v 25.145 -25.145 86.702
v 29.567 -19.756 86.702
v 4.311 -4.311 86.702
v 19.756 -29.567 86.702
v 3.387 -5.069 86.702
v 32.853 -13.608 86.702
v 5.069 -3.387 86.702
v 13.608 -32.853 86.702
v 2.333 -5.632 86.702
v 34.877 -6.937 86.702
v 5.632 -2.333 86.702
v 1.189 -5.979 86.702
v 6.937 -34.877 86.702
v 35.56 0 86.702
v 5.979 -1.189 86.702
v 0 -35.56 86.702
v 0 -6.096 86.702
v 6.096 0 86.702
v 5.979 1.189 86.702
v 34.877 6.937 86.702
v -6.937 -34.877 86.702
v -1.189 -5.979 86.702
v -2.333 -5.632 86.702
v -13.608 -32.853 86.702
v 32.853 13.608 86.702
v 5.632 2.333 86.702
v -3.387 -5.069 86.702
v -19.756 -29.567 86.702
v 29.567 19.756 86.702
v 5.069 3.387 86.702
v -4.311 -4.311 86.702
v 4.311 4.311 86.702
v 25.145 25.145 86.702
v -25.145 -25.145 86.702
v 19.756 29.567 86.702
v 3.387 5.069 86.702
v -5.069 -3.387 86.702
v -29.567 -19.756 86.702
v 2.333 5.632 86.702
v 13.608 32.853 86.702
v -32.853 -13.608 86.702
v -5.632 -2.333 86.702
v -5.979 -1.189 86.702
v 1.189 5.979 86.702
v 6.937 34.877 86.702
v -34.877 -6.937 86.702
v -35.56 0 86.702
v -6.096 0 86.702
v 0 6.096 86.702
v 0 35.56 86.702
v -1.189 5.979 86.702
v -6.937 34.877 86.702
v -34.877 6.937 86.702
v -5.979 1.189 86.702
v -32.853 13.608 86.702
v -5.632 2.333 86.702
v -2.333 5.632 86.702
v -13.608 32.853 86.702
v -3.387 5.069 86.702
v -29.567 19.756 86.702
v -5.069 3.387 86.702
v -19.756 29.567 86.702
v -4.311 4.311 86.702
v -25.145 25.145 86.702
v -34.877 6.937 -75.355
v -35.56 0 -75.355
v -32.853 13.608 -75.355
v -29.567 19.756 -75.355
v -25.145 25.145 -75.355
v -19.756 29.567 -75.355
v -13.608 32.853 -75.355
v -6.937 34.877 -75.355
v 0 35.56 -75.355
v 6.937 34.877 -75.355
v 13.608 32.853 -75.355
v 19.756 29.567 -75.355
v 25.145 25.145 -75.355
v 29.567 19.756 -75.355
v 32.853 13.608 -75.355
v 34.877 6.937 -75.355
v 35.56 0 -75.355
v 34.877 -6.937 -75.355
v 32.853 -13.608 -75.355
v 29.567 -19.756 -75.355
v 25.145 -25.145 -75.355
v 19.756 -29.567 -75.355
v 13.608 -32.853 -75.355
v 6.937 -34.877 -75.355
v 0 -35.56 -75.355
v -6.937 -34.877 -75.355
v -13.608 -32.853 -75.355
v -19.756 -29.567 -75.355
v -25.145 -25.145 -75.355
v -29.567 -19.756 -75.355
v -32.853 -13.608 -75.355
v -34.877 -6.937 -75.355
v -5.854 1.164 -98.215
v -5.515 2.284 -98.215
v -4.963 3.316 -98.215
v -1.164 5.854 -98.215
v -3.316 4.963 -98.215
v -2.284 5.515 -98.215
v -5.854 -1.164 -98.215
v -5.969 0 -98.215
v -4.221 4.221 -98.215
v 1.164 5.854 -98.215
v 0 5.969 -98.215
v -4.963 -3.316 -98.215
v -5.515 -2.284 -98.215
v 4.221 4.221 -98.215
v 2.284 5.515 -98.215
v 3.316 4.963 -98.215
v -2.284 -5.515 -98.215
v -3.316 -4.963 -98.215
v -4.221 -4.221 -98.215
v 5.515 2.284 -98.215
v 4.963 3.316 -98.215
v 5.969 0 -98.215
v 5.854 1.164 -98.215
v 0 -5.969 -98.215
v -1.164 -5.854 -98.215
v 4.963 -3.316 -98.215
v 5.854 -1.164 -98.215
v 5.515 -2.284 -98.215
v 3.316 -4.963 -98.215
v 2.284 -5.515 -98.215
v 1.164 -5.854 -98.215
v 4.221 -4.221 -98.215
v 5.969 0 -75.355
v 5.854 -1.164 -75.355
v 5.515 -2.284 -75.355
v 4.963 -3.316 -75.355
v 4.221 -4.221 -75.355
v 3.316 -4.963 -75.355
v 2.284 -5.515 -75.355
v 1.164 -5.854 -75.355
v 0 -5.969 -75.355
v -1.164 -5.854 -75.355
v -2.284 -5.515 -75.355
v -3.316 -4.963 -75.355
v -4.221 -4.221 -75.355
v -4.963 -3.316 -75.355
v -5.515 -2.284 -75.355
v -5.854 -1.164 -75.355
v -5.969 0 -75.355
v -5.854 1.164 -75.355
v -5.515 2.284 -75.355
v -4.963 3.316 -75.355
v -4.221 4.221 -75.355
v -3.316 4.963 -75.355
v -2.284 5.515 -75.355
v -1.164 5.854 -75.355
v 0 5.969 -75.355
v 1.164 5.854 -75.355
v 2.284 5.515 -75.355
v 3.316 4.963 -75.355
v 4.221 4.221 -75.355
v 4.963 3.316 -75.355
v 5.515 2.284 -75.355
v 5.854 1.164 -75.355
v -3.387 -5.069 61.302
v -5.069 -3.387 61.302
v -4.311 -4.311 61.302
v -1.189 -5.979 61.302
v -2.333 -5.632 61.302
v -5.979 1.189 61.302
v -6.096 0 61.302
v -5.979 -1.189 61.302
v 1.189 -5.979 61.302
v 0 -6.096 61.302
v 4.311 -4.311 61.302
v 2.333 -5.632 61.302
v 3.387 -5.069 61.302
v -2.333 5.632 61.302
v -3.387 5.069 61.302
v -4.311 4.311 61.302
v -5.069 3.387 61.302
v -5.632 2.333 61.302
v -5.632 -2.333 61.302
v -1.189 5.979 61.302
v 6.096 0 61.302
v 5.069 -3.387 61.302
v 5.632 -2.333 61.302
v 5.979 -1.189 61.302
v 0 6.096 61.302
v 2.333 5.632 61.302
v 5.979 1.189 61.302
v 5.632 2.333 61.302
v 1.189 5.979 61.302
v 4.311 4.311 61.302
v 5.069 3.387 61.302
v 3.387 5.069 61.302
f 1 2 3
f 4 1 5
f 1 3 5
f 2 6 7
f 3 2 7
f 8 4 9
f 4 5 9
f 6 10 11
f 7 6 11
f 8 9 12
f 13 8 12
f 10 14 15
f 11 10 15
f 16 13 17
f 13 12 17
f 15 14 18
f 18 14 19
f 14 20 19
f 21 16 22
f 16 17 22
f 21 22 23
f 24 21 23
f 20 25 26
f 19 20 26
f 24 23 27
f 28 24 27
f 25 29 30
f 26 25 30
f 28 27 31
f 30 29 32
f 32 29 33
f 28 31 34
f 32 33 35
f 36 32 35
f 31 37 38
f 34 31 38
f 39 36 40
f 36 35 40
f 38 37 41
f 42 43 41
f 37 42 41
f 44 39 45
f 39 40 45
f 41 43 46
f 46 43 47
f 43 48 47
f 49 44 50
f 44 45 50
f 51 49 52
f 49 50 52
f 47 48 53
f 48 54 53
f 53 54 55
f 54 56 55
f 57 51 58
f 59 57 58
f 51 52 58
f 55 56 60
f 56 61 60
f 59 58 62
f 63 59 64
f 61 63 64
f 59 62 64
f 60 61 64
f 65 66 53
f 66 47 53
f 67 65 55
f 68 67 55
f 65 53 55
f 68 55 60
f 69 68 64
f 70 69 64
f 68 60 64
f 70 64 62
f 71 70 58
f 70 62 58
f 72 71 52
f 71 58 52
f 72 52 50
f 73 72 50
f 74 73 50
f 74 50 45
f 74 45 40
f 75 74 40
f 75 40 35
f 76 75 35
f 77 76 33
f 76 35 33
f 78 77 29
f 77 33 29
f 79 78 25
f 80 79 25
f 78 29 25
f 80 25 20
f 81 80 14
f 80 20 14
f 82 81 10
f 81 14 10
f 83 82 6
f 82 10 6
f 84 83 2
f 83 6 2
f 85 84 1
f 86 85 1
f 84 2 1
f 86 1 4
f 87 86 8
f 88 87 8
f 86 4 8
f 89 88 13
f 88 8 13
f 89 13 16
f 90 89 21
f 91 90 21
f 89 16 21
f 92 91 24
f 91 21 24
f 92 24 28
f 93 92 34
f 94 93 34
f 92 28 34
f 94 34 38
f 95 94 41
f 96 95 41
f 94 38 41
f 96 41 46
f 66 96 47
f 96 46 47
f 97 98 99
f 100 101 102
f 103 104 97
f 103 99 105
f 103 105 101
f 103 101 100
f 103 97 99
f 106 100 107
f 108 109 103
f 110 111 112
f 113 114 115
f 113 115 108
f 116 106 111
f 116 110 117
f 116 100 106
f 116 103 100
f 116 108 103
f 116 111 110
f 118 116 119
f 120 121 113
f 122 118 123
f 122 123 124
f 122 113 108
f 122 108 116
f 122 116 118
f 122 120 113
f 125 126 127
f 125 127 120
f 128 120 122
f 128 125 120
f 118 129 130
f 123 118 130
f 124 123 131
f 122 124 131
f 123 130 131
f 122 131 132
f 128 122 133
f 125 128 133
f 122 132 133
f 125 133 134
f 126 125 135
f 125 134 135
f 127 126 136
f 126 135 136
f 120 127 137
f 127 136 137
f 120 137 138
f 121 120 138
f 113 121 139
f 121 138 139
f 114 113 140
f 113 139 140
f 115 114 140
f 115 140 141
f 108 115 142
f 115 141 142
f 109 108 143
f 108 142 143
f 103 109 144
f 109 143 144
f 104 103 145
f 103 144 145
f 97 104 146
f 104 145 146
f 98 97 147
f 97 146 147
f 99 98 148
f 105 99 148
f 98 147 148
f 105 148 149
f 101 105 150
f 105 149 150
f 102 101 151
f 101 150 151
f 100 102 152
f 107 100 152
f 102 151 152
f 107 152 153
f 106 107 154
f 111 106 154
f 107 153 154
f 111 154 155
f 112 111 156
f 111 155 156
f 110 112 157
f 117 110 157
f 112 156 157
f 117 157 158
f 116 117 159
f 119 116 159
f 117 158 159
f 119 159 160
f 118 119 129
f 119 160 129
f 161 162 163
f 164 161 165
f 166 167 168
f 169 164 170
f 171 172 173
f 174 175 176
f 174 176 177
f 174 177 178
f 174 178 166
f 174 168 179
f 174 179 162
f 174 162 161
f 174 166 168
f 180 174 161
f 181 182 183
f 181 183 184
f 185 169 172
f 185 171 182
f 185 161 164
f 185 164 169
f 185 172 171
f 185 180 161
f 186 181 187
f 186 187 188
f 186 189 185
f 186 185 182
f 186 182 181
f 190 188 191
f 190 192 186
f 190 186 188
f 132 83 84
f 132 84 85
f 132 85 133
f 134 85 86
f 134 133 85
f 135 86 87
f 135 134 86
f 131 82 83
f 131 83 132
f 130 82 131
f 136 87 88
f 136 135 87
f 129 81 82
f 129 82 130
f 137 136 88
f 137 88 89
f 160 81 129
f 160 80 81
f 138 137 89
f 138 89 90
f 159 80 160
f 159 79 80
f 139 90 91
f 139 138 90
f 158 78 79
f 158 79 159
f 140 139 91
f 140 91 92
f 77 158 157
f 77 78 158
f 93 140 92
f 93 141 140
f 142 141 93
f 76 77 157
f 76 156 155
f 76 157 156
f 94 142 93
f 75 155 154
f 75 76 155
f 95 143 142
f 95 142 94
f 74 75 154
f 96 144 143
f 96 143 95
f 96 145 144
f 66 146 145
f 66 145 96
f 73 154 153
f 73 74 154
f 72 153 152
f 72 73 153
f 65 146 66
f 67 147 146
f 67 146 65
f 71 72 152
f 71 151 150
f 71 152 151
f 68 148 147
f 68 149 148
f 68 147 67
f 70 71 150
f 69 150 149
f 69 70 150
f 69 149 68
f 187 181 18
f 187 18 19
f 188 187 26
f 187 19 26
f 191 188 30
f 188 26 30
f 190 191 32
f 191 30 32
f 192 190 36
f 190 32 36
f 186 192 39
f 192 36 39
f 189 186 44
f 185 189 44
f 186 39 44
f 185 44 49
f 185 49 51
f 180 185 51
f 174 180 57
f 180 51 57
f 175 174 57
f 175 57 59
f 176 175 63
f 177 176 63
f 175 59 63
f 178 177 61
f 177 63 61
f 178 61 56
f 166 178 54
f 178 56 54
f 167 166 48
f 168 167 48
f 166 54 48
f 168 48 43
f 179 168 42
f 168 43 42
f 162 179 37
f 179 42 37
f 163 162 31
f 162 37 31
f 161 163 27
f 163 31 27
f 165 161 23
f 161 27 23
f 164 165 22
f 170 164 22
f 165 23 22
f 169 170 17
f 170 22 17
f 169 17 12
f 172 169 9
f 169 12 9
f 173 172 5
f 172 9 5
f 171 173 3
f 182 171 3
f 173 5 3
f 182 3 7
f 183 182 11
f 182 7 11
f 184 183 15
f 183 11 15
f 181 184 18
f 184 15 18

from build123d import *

# Parameters (mm, degrees)
F0_W     = 35.56
F0_H     = 162.057699
F2_R     = 5.969
F3_DEPTH = 22.86
F4_R     = 6.096
F5_DEPTH = 25.4


with BuildPart() as f1:
    # F0 (on Front) → F1 (revolve)
    with BuildSketch(Plane.XZ):
        with Locations((-17.78, 5.673615)):
            Rectangle(F0_W, F0_H)
    revolve(axis=Axis((0, 0, 4.235234), (0, 0, -1)))

    # F2 (on face) → F3 (join)
    with BuildSketch(Plane(origin=(0, 0, -75.355234), x_dir=(1, 0, 0), z_dir=(0, 0, -1))):
        Circle(F2_R)
    extrude(amount=F3_DEPTH)

    # F4 (on face) → F5 (cut)
    with BuildSketch(Plane.XY.offset(86.702465)):
        Circle(F4_R)
    extrude(amount=-F5_DEPTH, mode=Mode.SUBTRACT)


solid = f1.part
